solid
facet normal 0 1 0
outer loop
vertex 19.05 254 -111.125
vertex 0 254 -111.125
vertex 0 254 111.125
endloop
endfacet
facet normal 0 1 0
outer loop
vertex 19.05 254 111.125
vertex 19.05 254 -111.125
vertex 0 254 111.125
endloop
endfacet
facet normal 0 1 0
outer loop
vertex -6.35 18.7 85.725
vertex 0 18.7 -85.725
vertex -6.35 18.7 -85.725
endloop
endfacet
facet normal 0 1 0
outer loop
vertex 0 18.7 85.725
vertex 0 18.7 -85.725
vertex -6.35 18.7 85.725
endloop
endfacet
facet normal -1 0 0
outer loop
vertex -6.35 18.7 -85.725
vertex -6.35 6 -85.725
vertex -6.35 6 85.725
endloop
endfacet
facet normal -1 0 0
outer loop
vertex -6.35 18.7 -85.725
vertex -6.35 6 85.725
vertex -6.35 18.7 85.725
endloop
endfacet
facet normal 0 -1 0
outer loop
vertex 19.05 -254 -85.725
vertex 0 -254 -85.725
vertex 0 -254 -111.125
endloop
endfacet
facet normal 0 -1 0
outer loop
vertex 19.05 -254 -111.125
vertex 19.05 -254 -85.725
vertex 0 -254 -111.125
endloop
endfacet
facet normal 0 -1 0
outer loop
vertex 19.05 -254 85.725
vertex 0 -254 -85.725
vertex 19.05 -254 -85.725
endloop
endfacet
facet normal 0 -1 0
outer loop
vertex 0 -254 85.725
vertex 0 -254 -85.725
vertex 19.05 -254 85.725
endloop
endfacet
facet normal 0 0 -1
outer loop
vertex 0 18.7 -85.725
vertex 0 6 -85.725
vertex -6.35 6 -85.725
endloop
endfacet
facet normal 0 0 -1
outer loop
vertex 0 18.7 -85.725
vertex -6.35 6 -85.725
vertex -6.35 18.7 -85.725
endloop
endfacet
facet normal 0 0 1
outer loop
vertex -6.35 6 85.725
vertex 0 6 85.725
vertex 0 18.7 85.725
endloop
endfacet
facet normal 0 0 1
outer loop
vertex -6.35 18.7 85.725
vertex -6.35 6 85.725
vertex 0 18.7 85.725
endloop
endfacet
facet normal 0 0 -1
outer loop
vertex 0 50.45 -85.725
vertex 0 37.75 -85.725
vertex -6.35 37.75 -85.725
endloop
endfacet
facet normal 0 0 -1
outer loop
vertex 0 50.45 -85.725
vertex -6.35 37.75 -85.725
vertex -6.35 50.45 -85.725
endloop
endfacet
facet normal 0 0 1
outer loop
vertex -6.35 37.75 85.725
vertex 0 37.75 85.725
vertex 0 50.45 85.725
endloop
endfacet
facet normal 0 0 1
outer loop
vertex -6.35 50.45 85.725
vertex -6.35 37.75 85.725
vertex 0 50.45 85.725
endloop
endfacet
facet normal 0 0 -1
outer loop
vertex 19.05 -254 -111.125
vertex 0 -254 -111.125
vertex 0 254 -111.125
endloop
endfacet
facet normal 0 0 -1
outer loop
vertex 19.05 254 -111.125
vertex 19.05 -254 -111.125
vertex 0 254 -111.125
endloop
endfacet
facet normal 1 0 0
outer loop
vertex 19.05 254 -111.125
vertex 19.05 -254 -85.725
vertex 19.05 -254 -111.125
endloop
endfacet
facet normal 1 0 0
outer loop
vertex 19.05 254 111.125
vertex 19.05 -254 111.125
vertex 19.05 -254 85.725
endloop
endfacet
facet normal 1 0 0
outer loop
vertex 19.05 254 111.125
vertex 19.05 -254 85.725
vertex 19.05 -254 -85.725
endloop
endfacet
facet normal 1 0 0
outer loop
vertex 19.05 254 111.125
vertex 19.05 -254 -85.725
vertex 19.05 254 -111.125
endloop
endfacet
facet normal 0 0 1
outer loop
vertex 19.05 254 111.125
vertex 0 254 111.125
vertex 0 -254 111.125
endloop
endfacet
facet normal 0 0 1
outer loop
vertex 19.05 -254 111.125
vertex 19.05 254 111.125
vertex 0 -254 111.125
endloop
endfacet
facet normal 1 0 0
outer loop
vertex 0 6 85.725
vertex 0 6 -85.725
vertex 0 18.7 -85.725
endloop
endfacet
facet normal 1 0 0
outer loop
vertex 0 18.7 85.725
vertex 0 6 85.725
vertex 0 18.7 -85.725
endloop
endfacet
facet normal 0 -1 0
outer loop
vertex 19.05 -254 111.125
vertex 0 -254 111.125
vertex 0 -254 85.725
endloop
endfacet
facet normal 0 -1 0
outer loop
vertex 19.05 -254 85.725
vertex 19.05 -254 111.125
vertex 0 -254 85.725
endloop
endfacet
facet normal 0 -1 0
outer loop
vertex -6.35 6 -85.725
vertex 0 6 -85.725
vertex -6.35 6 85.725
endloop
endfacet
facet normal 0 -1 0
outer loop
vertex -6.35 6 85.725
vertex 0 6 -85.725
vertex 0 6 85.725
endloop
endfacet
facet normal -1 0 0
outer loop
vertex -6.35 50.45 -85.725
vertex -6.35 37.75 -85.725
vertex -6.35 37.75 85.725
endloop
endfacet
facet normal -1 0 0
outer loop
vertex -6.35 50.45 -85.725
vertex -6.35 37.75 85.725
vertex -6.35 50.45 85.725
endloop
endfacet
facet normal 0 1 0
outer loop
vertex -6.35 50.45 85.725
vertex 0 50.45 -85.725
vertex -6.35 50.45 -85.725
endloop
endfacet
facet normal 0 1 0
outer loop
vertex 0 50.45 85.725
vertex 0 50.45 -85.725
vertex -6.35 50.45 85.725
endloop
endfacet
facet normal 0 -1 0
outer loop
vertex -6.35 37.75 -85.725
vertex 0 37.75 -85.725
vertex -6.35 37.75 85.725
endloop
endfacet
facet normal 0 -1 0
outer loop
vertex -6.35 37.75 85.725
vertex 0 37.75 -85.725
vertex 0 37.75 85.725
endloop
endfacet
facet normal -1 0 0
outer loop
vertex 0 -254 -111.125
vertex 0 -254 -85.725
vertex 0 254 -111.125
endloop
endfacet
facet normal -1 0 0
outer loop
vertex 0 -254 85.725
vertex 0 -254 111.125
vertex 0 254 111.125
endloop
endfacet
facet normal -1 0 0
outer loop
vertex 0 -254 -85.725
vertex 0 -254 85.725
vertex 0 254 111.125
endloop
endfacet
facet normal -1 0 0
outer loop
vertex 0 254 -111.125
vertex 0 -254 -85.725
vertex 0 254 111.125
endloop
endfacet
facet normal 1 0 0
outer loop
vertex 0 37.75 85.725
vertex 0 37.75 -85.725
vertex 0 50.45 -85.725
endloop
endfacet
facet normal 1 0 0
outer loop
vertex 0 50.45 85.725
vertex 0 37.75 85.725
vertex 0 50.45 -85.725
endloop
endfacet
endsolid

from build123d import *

# Parameters (mm, degrees)
F0_W     = 12.7
F0_H     = 171.45
F1_DEPTH = 6.35
F0_W_2   = 259.999907
F0_W_3   = 19.05
F2_DEPTH = 19.05


with BuildPart() as f1:
    # F0 (on Right) → F1 (new body)
    with BuildSketch(Plane.YZ):
        with Locations((12.349907, 0)):
            Rectangle(F0_W, F0_H)
        with Locations((44.099907, 0)):
            Rectangle(F0_W, F0_H)
    extrude(amount=-F1_DEPTH)


with BuildPart() as f2:
    # F0 (on Right) → F2 (new body)
    with BuildSketch(Plane.YZ):
        Polygon((50.449907, -85.725), (254, -85.725), (254, 111.125), (-254, 111.125), (-254, 85.725), (5.999907, 85.725), (18.699907, 85.725), (37.749907, 85.725), (50.449907, 85.725), align=None)
        with Locations((-124.000046, 0)):
            Rectangle(F0_W_2, F0_H)
        Polygon((-254, -111.125), (254, -111.125), (254, -85.725), (50.449907, -85.725), (37.749907, -85.725), (18.699907, -85.725), (5.999907, -85.725), (-254, -85.725), align=None)
        with Locations((12.349907, 0)):
            Rectangle(F0_W, F0_H)
        with Locations((28.224907, 0)):
            Rectangle(F0_W_3, F0_H)
        with Locations((44.099907, 0)):
            Rectangle(F0_W, F0_H)
    extrude(amount=F2_DEPTH)


solid = Compound([f1.part, f2.part])
